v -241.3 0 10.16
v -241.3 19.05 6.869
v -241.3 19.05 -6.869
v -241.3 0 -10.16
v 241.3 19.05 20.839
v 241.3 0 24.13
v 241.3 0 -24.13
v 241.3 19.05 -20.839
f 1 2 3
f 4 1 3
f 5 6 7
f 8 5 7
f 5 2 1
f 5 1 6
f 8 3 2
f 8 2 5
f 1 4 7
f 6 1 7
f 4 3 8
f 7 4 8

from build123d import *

# Parameters (mm, degrees)
SKETCH1_W           = 482.6
SKETCH1_H           = 50.8
BOSS_EXTRUDE1_DEPTH = 19.05
SKETCH5_W           = 508
SKETCH5_H           = 50.8
CUT_EXTRUDE1_DEPTH  = 246.940876462


with BuildPart() as part:
    # Sketch1 → Boss-Extrude1 (new body)
    with BuildSketch(Plane(origin=(0, 0, 0), x_dir=(1, 0, 0), z_dir=(0, 1, 0))):
        Rectangle(SKETCH1_W, SKETCH1_H)
    extrude(amount=BOSS_EXTRUDE1_DEPTH)

    # Sketch5 → Cut-Extrude1 (cut, through all)
    with BuildSketch(Plane(origin=(-0.481532302, 2.873320636, 16.634752254), x_dir=(0.9995934063300581, 0.0049512943147540294, 0.028080361573174478), z_dir=(-0.028513367553161754, 0.17014029390333138, 0.9850072427455884))):
        with Locations((0, 9.697527332)):
            Rectangle(SKETCH5_W, SKETCH5_H)
    cut_extrude1 = extrude(amount=CUT_EXTRUDE1_DEPTH, mode=Mode.SUBTRACT)

    # Mirror1: Cut-Extrude1 across plane
    add(cut_extrude1.mirror(Plane.XY), mode=Mode.SUBTRACT)


solid = part.part
